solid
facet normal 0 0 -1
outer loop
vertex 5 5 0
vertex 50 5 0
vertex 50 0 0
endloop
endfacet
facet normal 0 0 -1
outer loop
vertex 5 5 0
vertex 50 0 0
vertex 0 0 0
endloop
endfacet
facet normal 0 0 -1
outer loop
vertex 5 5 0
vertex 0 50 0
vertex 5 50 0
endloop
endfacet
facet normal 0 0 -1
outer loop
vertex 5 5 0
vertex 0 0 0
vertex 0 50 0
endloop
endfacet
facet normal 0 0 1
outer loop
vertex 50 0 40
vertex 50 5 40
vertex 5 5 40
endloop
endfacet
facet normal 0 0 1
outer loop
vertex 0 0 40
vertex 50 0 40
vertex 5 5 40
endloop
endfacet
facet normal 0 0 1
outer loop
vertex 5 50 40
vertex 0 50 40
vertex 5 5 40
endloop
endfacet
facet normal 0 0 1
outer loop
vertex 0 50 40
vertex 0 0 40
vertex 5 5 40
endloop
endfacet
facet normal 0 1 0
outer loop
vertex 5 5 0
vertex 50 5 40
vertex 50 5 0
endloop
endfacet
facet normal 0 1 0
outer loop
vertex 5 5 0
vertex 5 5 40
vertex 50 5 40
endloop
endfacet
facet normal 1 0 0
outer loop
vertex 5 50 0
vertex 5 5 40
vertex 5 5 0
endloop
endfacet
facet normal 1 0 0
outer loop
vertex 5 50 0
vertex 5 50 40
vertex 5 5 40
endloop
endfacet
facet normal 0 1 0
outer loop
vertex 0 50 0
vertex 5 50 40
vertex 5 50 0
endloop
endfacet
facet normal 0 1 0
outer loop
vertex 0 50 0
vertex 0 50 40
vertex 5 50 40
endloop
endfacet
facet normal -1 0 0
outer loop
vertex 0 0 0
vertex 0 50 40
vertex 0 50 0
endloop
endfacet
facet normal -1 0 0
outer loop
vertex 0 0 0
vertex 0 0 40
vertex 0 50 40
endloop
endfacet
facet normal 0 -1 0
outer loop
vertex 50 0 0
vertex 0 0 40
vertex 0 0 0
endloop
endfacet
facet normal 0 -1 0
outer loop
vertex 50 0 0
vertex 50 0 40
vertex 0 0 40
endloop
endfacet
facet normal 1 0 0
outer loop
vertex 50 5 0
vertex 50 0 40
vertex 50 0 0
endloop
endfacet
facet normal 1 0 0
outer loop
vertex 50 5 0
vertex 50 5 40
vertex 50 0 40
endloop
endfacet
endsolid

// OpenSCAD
$fn = 32;

// ----------------------------------------------------------------------
// Structural section: angle 50 x 50 mm
// ----------------------------------------------------------------------

// --- parameters (mm) ---
sec_w = 50;               // leg width, X
sec_h = 50;               // leg height, Y
flange_t = 5;             // leg thickness
plate_t = 40;             // cut length, Z (extrusion height)

profile = [[0, 0], [50, 0], [50, 5], [5, 5], [5, 50], [0, 50]];  // primary outline, 6 points, counter clockwise

// --- the one profile operation ---
linear_extrude(height = plate_t) polygon(points = profile);
